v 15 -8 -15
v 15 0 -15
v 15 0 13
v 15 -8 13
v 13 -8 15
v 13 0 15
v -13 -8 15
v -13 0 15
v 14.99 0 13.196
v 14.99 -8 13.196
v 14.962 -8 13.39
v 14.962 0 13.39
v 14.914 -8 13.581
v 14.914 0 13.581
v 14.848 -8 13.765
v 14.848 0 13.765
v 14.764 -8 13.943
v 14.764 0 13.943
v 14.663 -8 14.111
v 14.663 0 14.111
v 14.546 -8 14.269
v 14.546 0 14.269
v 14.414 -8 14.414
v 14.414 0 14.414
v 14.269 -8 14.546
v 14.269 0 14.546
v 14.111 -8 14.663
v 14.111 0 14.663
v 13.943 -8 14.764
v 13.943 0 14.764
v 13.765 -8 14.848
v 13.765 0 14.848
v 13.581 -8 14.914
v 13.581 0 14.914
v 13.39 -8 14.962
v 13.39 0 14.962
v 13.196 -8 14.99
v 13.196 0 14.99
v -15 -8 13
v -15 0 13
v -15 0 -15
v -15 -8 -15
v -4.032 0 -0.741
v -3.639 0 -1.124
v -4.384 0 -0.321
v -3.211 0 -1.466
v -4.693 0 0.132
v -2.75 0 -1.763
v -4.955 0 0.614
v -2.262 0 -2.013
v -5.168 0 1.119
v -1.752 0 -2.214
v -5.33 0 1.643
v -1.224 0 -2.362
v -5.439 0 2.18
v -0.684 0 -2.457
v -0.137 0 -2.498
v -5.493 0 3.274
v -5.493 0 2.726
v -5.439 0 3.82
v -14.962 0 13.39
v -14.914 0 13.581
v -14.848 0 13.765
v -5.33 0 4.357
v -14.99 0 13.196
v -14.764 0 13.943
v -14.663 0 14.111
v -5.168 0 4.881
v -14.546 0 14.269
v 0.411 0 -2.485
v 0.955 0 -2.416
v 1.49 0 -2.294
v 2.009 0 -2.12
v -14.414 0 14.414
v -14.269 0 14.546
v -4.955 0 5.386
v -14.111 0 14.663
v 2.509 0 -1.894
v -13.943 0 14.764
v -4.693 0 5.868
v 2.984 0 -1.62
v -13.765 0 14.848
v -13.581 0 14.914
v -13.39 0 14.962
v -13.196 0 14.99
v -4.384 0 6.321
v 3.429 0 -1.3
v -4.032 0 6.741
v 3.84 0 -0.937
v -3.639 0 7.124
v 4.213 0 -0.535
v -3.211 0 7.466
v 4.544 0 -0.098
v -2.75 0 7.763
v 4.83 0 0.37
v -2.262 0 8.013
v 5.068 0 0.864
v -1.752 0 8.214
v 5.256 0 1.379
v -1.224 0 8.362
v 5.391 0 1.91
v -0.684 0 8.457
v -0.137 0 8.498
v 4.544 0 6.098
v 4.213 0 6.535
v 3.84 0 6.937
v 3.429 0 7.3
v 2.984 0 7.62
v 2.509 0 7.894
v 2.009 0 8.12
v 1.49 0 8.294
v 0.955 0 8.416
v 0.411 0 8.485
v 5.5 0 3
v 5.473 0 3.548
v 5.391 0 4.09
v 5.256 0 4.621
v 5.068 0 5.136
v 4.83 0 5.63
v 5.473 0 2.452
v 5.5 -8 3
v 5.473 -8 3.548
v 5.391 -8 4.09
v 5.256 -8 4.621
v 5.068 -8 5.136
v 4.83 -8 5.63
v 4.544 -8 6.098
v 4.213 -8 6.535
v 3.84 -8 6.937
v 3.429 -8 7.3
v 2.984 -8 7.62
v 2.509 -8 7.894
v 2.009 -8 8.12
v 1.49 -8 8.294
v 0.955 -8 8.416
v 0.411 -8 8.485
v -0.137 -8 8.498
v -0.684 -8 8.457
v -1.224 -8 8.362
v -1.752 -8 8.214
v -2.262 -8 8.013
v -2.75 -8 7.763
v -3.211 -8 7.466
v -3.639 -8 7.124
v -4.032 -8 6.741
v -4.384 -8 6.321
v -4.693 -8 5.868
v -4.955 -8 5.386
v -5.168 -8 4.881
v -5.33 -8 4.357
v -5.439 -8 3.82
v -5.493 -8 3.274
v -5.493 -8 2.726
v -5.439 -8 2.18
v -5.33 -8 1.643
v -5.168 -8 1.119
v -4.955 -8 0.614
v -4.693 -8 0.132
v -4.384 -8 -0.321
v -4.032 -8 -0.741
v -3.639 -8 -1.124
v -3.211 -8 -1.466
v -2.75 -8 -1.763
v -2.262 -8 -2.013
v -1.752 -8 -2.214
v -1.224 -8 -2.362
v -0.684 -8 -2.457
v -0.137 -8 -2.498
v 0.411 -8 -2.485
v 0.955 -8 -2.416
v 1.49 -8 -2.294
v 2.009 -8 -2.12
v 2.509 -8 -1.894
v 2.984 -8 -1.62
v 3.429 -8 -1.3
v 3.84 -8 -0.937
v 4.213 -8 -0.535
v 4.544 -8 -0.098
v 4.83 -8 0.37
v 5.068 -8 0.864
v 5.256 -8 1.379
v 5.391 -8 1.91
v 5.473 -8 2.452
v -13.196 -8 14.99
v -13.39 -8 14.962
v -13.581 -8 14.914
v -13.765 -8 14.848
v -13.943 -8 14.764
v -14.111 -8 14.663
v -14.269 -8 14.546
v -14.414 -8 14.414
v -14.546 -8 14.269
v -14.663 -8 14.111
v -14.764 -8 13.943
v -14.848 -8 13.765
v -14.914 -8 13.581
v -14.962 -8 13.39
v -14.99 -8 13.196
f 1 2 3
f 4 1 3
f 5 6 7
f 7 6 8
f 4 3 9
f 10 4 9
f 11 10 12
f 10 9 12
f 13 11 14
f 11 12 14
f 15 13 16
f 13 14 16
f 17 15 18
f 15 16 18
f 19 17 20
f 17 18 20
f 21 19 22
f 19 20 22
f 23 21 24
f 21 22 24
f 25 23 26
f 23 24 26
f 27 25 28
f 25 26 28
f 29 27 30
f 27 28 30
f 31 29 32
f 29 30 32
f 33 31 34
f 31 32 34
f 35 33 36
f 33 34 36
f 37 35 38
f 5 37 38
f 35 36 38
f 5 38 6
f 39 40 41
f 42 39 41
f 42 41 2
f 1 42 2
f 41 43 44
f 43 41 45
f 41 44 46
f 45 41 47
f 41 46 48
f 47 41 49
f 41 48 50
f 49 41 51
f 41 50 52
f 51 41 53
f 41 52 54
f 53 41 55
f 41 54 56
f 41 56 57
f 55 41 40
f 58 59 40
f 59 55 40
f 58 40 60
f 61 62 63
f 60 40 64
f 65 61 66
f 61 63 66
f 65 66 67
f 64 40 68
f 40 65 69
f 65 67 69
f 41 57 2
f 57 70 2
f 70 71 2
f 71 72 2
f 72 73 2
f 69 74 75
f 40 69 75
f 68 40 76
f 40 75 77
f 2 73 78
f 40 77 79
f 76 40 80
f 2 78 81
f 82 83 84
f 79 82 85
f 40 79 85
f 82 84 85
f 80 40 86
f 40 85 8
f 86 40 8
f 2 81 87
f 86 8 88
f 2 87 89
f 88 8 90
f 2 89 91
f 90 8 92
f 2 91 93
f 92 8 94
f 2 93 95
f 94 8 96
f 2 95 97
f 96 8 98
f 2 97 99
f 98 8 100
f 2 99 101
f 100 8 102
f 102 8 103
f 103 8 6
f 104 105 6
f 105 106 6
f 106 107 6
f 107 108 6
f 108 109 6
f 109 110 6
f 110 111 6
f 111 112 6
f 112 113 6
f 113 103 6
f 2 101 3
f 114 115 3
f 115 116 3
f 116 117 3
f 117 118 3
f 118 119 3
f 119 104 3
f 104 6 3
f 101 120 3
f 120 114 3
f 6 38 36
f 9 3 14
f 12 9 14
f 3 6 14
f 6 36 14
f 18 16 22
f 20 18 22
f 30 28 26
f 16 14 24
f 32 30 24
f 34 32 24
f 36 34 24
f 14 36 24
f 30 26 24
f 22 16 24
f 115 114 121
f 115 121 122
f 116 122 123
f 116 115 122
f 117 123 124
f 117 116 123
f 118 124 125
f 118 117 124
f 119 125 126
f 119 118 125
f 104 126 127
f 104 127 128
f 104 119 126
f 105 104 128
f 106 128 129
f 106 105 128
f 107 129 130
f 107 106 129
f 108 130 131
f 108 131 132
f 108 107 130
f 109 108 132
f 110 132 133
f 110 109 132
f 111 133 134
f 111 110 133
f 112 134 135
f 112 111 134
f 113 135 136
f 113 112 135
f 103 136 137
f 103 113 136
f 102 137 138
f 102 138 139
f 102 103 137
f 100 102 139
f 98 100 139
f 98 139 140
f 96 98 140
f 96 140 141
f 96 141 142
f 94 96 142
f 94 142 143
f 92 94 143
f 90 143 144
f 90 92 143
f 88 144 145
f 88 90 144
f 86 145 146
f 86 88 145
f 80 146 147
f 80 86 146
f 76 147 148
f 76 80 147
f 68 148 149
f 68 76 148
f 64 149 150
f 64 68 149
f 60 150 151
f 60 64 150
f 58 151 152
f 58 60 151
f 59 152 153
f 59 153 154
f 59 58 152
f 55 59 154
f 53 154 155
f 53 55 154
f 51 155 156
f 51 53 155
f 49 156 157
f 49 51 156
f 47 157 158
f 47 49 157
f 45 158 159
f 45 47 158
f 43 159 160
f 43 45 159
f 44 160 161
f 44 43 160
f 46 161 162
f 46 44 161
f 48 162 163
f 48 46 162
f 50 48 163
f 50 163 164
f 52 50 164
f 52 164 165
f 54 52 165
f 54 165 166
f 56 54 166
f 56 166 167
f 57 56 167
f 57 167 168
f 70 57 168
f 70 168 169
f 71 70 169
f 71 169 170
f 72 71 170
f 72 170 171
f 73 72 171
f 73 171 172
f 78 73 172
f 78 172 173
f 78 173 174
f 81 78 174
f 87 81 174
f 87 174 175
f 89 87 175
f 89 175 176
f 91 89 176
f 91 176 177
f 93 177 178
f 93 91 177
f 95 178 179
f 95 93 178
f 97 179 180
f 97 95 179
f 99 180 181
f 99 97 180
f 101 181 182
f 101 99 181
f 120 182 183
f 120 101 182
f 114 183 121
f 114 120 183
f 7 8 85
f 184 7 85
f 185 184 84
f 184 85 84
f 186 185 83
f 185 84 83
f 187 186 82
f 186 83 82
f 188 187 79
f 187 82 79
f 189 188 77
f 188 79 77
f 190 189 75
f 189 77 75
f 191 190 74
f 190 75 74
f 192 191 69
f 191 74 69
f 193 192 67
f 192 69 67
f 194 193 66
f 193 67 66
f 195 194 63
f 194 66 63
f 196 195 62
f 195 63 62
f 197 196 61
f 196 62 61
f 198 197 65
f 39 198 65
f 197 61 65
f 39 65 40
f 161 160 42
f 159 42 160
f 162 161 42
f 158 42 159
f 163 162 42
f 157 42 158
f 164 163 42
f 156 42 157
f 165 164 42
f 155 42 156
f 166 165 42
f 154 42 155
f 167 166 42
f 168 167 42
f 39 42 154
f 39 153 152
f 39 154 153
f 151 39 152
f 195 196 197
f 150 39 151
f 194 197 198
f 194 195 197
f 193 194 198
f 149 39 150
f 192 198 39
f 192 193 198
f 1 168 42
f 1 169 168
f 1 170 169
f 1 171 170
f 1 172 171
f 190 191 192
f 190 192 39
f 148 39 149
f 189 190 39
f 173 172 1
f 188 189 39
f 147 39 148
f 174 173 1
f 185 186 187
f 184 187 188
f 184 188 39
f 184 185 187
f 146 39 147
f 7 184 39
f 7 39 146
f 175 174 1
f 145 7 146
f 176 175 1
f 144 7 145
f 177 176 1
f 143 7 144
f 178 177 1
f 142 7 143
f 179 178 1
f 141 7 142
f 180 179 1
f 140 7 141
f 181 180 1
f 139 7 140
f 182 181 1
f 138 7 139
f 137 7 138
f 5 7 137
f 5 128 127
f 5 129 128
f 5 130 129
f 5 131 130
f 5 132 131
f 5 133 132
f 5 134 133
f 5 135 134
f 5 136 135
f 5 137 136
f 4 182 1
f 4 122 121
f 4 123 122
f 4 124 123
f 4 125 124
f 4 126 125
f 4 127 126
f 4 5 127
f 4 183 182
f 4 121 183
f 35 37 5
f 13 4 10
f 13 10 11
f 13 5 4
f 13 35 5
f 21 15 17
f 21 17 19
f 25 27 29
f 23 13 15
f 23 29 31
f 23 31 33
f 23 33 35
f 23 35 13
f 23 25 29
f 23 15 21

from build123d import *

# Parameters (mm, degrees)
F0_R     = 5.5
F1_DEPTH = 8


with BuildPart() as f1:
    # F0 (on Front) → F1 (new body)
    with BuildSketch(Plane.XZ):
        with BuildLine():
            Line((-15, -15), (15, -15))
            Line((15, -15), (15, 13))
            ThreePointArc((15, 13), (14.414214, 14.414214), (13, 15))
            Line((13, 15), (-13, 15))
            ThreePointArc((-13, 15), (-14.414214, 14.414214), (-15, 13))
            Line((-15, 13), (-15, -15))
        make_face()
        with Locations((0, 3)):
            Circle(F0_R, mode=Mode.SUBTRACT)
    extrude(amount=F1_DEPTH)


solid = f1.part
